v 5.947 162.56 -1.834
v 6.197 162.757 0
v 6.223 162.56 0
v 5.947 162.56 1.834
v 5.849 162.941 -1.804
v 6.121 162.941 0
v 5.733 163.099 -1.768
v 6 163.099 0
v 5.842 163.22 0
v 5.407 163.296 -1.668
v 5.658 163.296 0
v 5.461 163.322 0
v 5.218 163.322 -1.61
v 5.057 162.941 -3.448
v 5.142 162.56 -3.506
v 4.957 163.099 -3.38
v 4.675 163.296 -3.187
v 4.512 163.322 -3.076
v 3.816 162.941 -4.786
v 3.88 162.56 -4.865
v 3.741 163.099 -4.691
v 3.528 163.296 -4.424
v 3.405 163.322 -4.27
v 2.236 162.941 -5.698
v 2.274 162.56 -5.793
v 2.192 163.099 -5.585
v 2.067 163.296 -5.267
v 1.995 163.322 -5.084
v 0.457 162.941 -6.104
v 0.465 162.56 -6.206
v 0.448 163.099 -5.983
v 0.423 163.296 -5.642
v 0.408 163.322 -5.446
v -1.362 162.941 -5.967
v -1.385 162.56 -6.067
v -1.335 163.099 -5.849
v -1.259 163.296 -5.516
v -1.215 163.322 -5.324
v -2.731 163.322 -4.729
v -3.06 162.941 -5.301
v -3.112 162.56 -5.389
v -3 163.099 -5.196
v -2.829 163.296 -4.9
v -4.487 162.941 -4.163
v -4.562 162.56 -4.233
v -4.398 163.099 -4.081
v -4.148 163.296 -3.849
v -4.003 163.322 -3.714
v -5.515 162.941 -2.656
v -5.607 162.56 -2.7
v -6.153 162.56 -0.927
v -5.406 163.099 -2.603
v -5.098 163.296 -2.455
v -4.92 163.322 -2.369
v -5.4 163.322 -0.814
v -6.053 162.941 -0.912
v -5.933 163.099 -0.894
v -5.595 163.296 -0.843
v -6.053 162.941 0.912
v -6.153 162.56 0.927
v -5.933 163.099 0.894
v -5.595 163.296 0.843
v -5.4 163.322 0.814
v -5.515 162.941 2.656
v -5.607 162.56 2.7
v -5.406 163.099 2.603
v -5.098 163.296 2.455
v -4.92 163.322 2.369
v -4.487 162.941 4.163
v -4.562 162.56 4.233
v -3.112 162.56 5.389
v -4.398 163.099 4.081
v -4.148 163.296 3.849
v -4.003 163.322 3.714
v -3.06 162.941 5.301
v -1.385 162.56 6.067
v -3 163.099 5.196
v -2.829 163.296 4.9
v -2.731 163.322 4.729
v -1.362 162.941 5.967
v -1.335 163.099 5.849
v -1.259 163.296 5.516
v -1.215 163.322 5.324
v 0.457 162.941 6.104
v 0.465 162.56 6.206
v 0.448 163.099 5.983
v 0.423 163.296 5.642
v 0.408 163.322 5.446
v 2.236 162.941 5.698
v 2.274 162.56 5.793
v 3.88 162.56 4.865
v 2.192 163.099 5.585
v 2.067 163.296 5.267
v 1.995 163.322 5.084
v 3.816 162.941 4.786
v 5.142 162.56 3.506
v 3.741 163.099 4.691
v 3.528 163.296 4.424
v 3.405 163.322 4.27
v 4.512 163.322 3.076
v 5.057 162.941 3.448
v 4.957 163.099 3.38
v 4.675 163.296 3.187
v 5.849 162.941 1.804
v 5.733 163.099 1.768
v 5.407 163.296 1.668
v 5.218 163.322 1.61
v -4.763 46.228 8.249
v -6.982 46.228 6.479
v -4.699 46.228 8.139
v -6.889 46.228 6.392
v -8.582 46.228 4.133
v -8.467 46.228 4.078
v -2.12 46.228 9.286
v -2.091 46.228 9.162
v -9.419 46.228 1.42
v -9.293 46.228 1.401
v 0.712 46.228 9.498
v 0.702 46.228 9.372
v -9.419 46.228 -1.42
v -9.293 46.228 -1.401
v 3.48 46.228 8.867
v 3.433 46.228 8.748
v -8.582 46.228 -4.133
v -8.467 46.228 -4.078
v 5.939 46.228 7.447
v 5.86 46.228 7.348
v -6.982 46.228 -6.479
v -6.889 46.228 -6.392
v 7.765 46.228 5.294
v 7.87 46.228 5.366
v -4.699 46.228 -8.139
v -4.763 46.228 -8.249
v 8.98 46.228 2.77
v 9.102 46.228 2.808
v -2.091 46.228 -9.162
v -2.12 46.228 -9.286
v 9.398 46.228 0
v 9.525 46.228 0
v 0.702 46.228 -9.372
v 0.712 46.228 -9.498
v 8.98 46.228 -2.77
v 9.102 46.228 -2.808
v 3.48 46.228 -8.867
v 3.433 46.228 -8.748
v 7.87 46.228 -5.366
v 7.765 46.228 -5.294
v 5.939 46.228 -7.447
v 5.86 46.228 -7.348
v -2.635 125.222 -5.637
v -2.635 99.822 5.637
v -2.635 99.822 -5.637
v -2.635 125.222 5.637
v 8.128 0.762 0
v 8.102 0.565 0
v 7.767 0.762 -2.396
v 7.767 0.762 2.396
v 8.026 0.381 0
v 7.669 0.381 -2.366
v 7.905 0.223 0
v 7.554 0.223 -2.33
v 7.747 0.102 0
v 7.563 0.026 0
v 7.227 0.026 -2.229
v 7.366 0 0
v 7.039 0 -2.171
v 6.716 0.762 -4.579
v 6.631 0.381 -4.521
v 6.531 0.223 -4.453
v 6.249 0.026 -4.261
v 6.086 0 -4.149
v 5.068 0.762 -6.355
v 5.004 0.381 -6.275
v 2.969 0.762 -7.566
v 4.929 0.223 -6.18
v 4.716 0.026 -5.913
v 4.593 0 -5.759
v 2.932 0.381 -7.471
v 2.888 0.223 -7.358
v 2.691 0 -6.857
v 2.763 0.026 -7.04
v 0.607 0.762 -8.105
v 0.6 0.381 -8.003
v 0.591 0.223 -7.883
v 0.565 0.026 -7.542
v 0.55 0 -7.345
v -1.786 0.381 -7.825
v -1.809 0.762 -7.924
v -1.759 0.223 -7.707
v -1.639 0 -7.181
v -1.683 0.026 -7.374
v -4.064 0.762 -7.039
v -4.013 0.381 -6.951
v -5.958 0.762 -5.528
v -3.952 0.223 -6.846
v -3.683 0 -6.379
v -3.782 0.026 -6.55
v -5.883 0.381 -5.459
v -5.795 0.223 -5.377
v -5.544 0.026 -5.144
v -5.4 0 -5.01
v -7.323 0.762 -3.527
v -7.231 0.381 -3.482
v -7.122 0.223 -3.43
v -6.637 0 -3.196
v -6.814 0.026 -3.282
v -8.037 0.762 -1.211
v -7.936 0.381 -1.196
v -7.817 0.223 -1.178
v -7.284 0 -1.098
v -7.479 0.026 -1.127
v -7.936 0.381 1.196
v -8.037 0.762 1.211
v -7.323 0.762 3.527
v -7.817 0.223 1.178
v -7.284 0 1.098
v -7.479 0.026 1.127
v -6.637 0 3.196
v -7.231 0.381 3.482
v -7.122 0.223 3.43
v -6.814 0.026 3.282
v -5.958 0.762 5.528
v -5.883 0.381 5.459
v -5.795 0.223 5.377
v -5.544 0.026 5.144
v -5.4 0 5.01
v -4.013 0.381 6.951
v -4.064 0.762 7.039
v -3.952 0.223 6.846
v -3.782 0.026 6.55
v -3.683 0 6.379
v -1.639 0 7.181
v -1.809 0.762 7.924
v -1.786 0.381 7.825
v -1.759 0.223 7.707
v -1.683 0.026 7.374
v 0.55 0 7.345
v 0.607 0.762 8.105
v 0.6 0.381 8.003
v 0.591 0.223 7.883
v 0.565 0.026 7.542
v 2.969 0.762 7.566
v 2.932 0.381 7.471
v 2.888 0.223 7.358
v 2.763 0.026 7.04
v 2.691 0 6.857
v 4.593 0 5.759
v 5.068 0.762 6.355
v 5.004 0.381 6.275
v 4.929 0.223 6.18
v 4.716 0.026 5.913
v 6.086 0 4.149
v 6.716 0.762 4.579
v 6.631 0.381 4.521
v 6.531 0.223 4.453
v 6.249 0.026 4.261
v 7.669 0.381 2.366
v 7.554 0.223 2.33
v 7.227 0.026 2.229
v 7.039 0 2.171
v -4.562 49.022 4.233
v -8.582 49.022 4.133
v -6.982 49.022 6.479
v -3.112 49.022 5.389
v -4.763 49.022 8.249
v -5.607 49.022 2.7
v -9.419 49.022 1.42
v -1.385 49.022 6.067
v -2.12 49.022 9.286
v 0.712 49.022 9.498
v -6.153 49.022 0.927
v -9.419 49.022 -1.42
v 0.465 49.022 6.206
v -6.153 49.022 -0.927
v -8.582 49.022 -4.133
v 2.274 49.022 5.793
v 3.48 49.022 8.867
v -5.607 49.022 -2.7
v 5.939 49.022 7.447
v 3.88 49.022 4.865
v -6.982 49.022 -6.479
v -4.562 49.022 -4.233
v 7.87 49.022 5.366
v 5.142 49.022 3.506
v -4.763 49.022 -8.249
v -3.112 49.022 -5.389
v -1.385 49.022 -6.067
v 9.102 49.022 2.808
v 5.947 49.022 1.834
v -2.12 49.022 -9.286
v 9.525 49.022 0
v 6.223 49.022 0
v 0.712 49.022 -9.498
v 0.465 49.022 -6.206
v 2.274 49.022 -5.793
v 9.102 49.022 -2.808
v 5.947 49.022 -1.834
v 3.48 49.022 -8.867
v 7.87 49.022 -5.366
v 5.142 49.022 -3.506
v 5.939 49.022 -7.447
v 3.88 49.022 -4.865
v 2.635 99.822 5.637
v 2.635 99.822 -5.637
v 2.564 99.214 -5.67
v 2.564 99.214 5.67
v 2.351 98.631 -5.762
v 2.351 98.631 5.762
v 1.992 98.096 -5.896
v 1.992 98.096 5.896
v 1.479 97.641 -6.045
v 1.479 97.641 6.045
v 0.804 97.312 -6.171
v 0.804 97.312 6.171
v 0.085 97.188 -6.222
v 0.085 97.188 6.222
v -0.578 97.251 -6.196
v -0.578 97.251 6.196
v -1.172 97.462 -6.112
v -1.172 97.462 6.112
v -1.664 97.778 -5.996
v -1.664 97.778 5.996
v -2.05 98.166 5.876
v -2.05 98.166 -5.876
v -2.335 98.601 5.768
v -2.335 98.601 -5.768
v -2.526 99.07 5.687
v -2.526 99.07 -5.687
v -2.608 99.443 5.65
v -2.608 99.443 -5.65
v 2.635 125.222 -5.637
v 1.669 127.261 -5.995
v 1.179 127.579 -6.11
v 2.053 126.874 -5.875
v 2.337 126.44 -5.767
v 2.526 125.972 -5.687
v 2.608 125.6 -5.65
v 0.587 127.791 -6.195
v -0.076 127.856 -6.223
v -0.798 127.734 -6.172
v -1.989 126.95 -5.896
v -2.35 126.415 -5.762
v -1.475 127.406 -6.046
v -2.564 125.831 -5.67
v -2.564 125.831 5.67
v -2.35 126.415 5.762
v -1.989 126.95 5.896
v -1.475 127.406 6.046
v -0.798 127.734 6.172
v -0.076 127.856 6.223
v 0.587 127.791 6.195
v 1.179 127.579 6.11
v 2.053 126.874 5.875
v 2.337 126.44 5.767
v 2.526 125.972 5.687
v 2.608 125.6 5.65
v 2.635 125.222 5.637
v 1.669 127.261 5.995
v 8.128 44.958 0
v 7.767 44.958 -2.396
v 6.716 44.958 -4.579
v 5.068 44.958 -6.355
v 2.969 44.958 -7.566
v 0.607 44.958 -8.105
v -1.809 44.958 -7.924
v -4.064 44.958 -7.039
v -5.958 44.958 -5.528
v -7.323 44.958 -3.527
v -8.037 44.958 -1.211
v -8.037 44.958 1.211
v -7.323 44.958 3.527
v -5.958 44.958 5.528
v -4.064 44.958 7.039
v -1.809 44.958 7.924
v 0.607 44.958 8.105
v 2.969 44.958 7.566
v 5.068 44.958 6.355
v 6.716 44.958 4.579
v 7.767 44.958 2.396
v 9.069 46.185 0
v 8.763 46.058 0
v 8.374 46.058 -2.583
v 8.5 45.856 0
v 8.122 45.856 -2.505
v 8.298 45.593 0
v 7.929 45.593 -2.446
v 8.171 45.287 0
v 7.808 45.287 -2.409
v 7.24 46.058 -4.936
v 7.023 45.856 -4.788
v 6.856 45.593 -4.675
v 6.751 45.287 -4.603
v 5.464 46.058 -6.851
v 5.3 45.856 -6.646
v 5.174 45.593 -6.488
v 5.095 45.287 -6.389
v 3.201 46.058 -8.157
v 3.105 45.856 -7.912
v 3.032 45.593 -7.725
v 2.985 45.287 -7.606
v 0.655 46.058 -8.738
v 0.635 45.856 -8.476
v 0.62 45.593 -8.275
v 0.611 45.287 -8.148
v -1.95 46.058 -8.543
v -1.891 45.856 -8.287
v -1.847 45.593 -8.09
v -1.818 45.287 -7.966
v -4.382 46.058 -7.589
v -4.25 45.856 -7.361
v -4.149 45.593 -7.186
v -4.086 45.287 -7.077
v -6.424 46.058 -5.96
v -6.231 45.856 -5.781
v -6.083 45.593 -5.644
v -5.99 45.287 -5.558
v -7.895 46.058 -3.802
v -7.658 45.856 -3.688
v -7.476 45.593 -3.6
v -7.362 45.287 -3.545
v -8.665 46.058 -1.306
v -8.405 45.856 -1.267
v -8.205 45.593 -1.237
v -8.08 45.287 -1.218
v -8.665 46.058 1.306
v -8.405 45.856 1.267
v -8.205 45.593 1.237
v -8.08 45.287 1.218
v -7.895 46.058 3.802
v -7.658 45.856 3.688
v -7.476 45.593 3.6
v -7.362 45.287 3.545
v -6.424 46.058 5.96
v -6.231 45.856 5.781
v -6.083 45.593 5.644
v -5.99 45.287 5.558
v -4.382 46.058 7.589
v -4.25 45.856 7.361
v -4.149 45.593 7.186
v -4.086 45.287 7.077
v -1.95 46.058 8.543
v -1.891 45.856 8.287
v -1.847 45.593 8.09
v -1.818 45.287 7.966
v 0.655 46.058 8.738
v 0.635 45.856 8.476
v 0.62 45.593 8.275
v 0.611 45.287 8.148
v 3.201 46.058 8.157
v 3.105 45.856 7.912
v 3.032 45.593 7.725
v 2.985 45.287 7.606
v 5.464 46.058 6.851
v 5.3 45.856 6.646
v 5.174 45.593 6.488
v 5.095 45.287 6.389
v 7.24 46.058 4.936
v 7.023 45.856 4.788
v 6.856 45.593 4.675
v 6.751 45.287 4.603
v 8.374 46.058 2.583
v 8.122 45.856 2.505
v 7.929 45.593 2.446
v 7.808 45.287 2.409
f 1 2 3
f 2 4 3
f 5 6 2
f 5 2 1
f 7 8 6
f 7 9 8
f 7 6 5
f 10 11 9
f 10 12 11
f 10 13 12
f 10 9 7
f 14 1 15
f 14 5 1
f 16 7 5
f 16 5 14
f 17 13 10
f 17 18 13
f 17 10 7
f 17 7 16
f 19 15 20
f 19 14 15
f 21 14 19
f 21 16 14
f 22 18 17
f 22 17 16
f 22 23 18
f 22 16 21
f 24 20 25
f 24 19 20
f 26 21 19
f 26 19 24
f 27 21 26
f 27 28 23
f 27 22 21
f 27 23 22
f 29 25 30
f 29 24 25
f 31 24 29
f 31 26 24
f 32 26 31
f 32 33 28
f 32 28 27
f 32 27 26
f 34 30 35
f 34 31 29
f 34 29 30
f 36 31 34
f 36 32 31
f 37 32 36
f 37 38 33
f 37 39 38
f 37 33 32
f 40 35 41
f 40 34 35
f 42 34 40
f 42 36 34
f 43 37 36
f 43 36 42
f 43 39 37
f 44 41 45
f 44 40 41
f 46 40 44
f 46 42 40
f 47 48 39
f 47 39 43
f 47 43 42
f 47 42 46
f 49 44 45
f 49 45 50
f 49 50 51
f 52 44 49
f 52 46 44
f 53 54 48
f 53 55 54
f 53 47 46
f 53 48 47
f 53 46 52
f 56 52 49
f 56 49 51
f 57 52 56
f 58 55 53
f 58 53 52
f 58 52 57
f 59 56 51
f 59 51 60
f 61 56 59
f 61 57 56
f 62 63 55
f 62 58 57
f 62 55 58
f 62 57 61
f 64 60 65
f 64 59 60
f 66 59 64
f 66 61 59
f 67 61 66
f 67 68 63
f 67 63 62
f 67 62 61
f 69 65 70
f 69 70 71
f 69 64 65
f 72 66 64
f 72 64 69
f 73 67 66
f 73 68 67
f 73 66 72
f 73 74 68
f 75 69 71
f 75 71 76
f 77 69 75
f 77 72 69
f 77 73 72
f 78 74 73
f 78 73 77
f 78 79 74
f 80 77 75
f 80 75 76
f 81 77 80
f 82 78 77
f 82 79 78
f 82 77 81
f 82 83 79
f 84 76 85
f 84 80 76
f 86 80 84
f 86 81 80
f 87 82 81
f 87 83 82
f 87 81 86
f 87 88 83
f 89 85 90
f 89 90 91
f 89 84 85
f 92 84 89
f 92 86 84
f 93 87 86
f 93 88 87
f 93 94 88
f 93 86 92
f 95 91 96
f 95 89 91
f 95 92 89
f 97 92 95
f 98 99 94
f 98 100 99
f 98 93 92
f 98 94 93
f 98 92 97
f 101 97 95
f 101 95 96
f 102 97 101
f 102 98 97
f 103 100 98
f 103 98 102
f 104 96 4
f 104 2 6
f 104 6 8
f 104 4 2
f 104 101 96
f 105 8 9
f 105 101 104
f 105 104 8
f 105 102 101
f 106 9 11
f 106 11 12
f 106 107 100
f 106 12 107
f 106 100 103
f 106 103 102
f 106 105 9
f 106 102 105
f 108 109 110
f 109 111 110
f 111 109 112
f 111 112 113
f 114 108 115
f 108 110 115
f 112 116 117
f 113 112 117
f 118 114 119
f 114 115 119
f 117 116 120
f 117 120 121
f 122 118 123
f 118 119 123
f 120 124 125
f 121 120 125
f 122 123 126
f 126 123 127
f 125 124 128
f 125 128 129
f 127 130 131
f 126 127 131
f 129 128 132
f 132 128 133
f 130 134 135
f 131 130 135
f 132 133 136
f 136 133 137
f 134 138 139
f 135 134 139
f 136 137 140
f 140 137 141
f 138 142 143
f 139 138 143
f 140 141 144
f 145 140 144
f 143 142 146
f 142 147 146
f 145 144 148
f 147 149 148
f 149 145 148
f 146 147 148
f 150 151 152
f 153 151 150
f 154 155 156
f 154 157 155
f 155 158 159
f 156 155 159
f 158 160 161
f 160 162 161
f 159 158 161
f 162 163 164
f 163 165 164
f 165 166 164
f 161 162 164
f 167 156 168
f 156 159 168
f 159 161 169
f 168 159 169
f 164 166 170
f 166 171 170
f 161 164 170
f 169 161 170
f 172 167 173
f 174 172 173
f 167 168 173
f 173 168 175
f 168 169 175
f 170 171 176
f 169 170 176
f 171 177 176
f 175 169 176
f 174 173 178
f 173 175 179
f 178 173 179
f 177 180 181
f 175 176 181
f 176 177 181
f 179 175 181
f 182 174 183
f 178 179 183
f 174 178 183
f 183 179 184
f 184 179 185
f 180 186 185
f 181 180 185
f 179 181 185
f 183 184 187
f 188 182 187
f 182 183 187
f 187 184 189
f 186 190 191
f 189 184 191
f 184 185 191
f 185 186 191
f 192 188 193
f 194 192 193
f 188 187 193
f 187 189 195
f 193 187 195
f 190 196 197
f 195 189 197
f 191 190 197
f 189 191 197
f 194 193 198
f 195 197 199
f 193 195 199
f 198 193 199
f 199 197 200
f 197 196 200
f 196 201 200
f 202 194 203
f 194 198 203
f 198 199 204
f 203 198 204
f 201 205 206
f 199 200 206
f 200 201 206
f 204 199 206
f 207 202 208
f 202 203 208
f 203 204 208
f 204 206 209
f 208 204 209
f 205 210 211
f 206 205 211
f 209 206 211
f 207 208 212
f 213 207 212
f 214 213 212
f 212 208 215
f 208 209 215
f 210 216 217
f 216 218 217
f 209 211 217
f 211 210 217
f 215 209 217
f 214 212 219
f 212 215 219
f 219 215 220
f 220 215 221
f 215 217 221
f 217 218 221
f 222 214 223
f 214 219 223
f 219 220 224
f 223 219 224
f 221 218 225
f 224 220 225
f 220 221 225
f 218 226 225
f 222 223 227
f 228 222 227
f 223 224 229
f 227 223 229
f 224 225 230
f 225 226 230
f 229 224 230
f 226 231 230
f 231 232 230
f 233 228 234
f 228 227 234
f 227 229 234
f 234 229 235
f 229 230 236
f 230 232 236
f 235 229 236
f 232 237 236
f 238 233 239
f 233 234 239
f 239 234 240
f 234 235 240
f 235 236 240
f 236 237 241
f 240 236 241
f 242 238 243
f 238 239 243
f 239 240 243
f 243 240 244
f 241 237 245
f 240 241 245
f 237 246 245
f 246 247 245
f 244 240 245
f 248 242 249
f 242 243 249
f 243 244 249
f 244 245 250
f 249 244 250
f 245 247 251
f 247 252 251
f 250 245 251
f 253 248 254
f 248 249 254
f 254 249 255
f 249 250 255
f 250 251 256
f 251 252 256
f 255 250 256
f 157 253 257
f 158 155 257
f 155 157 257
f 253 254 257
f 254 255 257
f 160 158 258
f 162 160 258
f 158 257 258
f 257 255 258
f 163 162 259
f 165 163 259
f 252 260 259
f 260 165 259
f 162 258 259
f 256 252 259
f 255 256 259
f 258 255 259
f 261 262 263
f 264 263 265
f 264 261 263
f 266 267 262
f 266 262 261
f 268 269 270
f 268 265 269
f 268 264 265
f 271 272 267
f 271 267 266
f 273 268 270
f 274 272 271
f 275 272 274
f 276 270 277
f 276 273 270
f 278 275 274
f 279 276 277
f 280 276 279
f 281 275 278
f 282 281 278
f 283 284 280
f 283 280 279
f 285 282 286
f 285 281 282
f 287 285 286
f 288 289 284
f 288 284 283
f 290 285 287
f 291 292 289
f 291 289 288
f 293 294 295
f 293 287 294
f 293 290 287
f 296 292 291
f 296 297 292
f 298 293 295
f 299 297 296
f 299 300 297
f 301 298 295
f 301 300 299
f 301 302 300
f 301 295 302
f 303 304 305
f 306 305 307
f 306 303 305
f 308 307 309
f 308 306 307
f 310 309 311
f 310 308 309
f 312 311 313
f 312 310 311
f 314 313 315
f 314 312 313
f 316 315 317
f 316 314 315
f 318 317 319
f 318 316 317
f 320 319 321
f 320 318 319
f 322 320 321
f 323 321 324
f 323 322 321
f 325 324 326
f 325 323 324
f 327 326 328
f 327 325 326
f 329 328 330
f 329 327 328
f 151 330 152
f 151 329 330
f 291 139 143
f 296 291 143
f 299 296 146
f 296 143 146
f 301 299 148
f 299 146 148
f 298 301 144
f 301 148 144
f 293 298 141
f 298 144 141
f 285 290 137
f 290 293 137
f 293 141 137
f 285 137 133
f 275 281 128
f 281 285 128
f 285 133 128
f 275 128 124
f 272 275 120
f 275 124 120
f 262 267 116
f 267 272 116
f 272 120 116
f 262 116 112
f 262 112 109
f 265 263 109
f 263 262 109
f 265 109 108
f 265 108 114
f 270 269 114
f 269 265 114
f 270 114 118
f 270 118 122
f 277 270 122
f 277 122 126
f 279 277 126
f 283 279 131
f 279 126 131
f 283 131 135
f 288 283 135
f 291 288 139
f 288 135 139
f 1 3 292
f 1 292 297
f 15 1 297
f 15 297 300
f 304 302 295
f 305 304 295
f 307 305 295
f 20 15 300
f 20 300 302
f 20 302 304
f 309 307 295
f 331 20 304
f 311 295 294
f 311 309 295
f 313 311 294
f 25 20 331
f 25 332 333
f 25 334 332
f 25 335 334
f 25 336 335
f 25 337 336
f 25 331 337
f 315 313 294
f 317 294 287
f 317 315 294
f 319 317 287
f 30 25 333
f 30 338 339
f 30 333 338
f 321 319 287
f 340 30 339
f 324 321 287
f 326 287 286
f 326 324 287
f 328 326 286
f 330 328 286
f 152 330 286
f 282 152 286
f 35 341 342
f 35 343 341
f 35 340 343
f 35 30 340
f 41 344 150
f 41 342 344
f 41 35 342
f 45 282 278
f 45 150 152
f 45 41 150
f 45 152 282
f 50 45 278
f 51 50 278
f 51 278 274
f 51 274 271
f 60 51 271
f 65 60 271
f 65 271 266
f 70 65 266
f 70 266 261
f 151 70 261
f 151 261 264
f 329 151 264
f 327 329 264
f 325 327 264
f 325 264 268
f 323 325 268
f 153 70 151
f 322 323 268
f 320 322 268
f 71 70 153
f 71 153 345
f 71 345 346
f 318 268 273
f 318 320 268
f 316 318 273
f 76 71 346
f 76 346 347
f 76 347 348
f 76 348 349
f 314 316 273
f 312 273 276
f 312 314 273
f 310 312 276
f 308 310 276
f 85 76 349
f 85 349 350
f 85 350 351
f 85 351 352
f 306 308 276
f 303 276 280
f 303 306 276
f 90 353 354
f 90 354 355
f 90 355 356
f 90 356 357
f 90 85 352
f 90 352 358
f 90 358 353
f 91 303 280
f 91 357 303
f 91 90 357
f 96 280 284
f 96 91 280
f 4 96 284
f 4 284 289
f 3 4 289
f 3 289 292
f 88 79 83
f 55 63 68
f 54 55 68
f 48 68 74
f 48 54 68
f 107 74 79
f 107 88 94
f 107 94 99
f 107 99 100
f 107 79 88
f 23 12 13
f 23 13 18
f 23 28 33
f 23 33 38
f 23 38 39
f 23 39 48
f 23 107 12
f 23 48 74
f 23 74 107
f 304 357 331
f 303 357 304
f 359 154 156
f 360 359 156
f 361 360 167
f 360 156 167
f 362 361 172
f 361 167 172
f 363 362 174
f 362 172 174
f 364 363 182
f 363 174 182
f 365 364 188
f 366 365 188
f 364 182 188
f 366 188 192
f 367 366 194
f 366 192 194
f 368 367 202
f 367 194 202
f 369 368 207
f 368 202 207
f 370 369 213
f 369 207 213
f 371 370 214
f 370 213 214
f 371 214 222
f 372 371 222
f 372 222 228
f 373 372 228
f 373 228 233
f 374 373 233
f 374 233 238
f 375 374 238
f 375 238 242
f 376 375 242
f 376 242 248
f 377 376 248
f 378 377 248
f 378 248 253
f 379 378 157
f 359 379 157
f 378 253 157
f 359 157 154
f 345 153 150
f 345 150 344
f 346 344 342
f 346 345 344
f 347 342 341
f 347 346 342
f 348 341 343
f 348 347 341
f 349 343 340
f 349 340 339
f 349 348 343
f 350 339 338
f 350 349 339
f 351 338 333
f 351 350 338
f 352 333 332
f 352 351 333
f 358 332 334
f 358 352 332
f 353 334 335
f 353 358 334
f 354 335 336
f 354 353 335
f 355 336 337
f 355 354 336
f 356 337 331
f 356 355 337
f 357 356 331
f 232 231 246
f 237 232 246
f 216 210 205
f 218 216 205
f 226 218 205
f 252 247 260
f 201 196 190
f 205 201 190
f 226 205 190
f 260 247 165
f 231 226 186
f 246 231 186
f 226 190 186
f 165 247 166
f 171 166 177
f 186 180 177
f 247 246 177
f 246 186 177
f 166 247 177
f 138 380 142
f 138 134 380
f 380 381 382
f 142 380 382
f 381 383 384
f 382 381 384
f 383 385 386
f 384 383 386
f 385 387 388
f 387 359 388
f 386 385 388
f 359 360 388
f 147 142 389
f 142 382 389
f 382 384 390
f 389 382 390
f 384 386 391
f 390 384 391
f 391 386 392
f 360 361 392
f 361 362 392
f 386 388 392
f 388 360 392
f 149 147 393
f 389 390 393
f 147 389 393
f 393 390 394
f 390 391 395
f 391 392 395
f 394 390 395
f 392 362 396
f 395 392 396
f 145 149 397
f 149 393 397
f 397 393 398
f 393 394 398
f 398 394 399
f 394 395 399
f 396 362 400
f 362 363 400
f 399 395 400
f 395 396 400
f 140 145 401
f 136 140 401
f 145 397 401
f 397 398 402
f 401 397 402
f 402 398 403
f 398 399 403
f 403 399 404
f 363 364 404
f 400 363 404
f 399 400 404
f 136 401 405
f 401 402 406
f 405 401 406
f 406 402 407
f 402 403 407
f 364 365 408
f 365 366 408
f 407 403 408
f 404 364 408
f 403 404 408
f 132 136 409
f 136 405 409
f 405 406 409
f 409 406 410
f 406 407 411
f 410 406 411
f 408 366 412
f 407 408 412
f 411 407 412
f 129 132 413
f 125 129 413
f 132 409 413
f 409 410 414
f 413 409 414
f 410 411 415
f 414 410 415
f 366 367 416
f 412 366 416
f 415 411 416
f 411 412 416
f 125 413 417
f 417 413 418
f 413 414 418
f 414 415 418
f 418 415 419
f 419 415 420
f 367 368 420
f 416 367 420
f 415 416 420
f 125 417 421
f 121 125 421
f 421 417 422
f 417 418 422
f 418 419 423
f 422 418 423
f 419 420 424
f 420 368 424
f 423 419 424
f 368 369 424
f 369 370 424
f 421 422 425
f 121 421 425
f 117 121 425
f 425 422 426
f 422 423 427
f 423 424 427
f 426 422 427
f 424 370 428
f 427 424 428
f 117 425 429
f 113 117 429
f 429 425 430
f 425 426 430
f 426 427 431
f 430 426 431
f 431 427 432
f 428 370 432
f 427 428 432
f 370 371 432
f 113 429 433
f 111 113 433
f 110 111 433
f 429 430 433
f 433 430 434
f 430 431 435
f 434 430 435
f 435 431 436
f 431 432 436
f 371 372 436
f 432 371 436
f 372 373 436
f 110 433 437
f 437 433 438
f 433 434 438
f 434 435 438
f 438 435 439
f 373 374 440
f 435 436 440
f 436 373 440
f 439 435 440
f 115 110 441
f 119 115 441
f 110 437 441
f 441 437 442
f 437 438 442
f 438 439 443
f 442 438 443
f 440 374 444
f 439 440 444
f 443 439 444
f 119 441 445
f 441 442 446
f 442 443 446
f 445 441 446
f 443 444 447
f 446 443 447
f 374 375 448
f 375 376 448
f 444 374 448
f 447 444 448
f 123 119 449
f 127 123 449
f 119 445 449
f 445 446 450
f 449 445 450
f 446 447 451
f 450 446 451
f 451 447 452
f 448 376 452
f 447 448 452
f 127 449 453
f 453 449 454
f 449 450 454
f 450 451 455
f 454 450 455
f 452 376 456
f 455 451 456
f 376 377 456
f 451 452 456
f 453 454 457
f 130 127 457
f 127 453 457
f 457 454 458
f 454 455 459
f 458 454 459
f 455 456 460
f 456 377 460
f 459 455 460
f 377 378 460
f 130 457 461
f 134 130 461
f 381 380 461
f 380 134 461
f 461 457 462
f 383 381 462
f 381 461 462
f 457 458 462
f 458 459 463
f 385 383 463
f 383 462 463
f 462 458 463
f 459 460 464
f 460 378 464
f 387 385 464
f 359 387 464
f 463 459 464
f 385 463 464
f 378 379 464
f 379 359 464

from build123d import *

# Parameters (mm, degrees)
SKETCH1_R               = 9.525
BOSS_EXTRUDE1_DEPTH     = 163.322
SKETCH2_OUTSIDE_W       = 54.156
SKETCH2_OUTSIDE_H       = 54.156
SKETCH2_OUTSIDE_R       = 8.128
CUT_EXTRUDE1_DEPTH      = 46.228
SKETCH3_OUTSIDE_W       = 54.156
SKETCH3_OUTSIDE_H       = 54.156
SKETCH3_OUTSIDE_R       = 6.223
CUT_EXTRUDE2_DEPTH      = 114.3
FILLET1_R               = 1.27
CUT_EXTRUDE3_DEPTH      = 10.525
CUT_EXTRUDE3_DEPTH_BACK = 10.525
FILLET2_R               = 0.762
FILLET3_R               = 0.762


with BuildPart() as part:
    # Sketch1 → Boss-Extrude1 (new body)
    with BuildSketch(Plane(origin=(0, 0, 0), x_dir=(1, 0, 0), z_dir=(0, 1, 0))):
        Circle(SKETCH1_R)
    extrude(amount=BOSS_EXTRUDE1_DEPTH)

    # Sketch2 outside → Cut-Extrude1 (cut)
    with BuildSketch(Plane(origin=(0, 0, 0), x_dir=(1, 0, 0), z_dir=(0, 1, 0))):
        Rectangle(SKETCH2_OUTSIDE_W, SKETCH2_OUTSIDE_H)
        Circle(SKETCH2_OUTSIDE_R, mode=Mode.SUBTRACT)
    extrude(amount=CUT_EXTRUDE1_DEPTH, mode=Mode.SUBTRACT)

    # Sketch3 outside → Cut-Extrude2 (cut)
    with BuildSketch(Plane(origin=(0, 163.322, 0), x_dir=(1, 0, 0), z_dir=(0, 1, 0))):
        Rectangle(SKETCH3_OUTSIDE_W, SKETCH3_OUTSIDE_H)
        Circle(SKETCH3_OUTSIDE_R, mode=Mode.SUBTRACT)
    extrude(amount=-CUT_EXTRUDE2_DEPTH, mode=Mode.SUBTRACT)

    # Fillet1
    fillet1_edges = [part.edges().sort_by_distance(p)[0] for p in [
        (-8.128, 46.228, 0),
    ]]
    fillet(fillet1_edges, radius=FILLET1_R)

    # Sketch4 → Cut-Extrude3 (cut, two sides)
    with BuildSketch(Plane.XY) as cut_extrude3_sk:
        with BuildLine():
            Line((2.63525, 125.222), (2.63525, 99.822))
            ThreePointArc((2.63525, 99.822), (0, 97.18675), (-2.63525, 99.822))
            Line((-2.63525, 99.822), (-2.63525, 125.222))
            ThreePointArc((-2.63525, 125.222), (0, 127.85725), (2.63525, 125.222))
        make_face()
    extrude(amount=CUT_EXTRUDE3_DEPTH, mode=Mode.SUBTRACT)
    extrude(cut_extrude3_sk.sketch, amount=-CUT_EXTRUDE3_DEPTH_BACK, mode=Mode.SUBTRACT)

    # Fillet2
    fillet2_edges = [part.edges().sort_by_distance(p)[0] for p in [
        (-6.223, 163.322, 0),
    ]]
    fillet(fillet2_edges, radius=FILLET2_R)

    # Fillet3
    fillet3_edges = [part.edges().sort_by_distance(p)[0] for p in [
        (-8.128, 0, 0),
    ]]
    fillet(fillet3_edges, radius=FILLET3_R)


solid = part.part
